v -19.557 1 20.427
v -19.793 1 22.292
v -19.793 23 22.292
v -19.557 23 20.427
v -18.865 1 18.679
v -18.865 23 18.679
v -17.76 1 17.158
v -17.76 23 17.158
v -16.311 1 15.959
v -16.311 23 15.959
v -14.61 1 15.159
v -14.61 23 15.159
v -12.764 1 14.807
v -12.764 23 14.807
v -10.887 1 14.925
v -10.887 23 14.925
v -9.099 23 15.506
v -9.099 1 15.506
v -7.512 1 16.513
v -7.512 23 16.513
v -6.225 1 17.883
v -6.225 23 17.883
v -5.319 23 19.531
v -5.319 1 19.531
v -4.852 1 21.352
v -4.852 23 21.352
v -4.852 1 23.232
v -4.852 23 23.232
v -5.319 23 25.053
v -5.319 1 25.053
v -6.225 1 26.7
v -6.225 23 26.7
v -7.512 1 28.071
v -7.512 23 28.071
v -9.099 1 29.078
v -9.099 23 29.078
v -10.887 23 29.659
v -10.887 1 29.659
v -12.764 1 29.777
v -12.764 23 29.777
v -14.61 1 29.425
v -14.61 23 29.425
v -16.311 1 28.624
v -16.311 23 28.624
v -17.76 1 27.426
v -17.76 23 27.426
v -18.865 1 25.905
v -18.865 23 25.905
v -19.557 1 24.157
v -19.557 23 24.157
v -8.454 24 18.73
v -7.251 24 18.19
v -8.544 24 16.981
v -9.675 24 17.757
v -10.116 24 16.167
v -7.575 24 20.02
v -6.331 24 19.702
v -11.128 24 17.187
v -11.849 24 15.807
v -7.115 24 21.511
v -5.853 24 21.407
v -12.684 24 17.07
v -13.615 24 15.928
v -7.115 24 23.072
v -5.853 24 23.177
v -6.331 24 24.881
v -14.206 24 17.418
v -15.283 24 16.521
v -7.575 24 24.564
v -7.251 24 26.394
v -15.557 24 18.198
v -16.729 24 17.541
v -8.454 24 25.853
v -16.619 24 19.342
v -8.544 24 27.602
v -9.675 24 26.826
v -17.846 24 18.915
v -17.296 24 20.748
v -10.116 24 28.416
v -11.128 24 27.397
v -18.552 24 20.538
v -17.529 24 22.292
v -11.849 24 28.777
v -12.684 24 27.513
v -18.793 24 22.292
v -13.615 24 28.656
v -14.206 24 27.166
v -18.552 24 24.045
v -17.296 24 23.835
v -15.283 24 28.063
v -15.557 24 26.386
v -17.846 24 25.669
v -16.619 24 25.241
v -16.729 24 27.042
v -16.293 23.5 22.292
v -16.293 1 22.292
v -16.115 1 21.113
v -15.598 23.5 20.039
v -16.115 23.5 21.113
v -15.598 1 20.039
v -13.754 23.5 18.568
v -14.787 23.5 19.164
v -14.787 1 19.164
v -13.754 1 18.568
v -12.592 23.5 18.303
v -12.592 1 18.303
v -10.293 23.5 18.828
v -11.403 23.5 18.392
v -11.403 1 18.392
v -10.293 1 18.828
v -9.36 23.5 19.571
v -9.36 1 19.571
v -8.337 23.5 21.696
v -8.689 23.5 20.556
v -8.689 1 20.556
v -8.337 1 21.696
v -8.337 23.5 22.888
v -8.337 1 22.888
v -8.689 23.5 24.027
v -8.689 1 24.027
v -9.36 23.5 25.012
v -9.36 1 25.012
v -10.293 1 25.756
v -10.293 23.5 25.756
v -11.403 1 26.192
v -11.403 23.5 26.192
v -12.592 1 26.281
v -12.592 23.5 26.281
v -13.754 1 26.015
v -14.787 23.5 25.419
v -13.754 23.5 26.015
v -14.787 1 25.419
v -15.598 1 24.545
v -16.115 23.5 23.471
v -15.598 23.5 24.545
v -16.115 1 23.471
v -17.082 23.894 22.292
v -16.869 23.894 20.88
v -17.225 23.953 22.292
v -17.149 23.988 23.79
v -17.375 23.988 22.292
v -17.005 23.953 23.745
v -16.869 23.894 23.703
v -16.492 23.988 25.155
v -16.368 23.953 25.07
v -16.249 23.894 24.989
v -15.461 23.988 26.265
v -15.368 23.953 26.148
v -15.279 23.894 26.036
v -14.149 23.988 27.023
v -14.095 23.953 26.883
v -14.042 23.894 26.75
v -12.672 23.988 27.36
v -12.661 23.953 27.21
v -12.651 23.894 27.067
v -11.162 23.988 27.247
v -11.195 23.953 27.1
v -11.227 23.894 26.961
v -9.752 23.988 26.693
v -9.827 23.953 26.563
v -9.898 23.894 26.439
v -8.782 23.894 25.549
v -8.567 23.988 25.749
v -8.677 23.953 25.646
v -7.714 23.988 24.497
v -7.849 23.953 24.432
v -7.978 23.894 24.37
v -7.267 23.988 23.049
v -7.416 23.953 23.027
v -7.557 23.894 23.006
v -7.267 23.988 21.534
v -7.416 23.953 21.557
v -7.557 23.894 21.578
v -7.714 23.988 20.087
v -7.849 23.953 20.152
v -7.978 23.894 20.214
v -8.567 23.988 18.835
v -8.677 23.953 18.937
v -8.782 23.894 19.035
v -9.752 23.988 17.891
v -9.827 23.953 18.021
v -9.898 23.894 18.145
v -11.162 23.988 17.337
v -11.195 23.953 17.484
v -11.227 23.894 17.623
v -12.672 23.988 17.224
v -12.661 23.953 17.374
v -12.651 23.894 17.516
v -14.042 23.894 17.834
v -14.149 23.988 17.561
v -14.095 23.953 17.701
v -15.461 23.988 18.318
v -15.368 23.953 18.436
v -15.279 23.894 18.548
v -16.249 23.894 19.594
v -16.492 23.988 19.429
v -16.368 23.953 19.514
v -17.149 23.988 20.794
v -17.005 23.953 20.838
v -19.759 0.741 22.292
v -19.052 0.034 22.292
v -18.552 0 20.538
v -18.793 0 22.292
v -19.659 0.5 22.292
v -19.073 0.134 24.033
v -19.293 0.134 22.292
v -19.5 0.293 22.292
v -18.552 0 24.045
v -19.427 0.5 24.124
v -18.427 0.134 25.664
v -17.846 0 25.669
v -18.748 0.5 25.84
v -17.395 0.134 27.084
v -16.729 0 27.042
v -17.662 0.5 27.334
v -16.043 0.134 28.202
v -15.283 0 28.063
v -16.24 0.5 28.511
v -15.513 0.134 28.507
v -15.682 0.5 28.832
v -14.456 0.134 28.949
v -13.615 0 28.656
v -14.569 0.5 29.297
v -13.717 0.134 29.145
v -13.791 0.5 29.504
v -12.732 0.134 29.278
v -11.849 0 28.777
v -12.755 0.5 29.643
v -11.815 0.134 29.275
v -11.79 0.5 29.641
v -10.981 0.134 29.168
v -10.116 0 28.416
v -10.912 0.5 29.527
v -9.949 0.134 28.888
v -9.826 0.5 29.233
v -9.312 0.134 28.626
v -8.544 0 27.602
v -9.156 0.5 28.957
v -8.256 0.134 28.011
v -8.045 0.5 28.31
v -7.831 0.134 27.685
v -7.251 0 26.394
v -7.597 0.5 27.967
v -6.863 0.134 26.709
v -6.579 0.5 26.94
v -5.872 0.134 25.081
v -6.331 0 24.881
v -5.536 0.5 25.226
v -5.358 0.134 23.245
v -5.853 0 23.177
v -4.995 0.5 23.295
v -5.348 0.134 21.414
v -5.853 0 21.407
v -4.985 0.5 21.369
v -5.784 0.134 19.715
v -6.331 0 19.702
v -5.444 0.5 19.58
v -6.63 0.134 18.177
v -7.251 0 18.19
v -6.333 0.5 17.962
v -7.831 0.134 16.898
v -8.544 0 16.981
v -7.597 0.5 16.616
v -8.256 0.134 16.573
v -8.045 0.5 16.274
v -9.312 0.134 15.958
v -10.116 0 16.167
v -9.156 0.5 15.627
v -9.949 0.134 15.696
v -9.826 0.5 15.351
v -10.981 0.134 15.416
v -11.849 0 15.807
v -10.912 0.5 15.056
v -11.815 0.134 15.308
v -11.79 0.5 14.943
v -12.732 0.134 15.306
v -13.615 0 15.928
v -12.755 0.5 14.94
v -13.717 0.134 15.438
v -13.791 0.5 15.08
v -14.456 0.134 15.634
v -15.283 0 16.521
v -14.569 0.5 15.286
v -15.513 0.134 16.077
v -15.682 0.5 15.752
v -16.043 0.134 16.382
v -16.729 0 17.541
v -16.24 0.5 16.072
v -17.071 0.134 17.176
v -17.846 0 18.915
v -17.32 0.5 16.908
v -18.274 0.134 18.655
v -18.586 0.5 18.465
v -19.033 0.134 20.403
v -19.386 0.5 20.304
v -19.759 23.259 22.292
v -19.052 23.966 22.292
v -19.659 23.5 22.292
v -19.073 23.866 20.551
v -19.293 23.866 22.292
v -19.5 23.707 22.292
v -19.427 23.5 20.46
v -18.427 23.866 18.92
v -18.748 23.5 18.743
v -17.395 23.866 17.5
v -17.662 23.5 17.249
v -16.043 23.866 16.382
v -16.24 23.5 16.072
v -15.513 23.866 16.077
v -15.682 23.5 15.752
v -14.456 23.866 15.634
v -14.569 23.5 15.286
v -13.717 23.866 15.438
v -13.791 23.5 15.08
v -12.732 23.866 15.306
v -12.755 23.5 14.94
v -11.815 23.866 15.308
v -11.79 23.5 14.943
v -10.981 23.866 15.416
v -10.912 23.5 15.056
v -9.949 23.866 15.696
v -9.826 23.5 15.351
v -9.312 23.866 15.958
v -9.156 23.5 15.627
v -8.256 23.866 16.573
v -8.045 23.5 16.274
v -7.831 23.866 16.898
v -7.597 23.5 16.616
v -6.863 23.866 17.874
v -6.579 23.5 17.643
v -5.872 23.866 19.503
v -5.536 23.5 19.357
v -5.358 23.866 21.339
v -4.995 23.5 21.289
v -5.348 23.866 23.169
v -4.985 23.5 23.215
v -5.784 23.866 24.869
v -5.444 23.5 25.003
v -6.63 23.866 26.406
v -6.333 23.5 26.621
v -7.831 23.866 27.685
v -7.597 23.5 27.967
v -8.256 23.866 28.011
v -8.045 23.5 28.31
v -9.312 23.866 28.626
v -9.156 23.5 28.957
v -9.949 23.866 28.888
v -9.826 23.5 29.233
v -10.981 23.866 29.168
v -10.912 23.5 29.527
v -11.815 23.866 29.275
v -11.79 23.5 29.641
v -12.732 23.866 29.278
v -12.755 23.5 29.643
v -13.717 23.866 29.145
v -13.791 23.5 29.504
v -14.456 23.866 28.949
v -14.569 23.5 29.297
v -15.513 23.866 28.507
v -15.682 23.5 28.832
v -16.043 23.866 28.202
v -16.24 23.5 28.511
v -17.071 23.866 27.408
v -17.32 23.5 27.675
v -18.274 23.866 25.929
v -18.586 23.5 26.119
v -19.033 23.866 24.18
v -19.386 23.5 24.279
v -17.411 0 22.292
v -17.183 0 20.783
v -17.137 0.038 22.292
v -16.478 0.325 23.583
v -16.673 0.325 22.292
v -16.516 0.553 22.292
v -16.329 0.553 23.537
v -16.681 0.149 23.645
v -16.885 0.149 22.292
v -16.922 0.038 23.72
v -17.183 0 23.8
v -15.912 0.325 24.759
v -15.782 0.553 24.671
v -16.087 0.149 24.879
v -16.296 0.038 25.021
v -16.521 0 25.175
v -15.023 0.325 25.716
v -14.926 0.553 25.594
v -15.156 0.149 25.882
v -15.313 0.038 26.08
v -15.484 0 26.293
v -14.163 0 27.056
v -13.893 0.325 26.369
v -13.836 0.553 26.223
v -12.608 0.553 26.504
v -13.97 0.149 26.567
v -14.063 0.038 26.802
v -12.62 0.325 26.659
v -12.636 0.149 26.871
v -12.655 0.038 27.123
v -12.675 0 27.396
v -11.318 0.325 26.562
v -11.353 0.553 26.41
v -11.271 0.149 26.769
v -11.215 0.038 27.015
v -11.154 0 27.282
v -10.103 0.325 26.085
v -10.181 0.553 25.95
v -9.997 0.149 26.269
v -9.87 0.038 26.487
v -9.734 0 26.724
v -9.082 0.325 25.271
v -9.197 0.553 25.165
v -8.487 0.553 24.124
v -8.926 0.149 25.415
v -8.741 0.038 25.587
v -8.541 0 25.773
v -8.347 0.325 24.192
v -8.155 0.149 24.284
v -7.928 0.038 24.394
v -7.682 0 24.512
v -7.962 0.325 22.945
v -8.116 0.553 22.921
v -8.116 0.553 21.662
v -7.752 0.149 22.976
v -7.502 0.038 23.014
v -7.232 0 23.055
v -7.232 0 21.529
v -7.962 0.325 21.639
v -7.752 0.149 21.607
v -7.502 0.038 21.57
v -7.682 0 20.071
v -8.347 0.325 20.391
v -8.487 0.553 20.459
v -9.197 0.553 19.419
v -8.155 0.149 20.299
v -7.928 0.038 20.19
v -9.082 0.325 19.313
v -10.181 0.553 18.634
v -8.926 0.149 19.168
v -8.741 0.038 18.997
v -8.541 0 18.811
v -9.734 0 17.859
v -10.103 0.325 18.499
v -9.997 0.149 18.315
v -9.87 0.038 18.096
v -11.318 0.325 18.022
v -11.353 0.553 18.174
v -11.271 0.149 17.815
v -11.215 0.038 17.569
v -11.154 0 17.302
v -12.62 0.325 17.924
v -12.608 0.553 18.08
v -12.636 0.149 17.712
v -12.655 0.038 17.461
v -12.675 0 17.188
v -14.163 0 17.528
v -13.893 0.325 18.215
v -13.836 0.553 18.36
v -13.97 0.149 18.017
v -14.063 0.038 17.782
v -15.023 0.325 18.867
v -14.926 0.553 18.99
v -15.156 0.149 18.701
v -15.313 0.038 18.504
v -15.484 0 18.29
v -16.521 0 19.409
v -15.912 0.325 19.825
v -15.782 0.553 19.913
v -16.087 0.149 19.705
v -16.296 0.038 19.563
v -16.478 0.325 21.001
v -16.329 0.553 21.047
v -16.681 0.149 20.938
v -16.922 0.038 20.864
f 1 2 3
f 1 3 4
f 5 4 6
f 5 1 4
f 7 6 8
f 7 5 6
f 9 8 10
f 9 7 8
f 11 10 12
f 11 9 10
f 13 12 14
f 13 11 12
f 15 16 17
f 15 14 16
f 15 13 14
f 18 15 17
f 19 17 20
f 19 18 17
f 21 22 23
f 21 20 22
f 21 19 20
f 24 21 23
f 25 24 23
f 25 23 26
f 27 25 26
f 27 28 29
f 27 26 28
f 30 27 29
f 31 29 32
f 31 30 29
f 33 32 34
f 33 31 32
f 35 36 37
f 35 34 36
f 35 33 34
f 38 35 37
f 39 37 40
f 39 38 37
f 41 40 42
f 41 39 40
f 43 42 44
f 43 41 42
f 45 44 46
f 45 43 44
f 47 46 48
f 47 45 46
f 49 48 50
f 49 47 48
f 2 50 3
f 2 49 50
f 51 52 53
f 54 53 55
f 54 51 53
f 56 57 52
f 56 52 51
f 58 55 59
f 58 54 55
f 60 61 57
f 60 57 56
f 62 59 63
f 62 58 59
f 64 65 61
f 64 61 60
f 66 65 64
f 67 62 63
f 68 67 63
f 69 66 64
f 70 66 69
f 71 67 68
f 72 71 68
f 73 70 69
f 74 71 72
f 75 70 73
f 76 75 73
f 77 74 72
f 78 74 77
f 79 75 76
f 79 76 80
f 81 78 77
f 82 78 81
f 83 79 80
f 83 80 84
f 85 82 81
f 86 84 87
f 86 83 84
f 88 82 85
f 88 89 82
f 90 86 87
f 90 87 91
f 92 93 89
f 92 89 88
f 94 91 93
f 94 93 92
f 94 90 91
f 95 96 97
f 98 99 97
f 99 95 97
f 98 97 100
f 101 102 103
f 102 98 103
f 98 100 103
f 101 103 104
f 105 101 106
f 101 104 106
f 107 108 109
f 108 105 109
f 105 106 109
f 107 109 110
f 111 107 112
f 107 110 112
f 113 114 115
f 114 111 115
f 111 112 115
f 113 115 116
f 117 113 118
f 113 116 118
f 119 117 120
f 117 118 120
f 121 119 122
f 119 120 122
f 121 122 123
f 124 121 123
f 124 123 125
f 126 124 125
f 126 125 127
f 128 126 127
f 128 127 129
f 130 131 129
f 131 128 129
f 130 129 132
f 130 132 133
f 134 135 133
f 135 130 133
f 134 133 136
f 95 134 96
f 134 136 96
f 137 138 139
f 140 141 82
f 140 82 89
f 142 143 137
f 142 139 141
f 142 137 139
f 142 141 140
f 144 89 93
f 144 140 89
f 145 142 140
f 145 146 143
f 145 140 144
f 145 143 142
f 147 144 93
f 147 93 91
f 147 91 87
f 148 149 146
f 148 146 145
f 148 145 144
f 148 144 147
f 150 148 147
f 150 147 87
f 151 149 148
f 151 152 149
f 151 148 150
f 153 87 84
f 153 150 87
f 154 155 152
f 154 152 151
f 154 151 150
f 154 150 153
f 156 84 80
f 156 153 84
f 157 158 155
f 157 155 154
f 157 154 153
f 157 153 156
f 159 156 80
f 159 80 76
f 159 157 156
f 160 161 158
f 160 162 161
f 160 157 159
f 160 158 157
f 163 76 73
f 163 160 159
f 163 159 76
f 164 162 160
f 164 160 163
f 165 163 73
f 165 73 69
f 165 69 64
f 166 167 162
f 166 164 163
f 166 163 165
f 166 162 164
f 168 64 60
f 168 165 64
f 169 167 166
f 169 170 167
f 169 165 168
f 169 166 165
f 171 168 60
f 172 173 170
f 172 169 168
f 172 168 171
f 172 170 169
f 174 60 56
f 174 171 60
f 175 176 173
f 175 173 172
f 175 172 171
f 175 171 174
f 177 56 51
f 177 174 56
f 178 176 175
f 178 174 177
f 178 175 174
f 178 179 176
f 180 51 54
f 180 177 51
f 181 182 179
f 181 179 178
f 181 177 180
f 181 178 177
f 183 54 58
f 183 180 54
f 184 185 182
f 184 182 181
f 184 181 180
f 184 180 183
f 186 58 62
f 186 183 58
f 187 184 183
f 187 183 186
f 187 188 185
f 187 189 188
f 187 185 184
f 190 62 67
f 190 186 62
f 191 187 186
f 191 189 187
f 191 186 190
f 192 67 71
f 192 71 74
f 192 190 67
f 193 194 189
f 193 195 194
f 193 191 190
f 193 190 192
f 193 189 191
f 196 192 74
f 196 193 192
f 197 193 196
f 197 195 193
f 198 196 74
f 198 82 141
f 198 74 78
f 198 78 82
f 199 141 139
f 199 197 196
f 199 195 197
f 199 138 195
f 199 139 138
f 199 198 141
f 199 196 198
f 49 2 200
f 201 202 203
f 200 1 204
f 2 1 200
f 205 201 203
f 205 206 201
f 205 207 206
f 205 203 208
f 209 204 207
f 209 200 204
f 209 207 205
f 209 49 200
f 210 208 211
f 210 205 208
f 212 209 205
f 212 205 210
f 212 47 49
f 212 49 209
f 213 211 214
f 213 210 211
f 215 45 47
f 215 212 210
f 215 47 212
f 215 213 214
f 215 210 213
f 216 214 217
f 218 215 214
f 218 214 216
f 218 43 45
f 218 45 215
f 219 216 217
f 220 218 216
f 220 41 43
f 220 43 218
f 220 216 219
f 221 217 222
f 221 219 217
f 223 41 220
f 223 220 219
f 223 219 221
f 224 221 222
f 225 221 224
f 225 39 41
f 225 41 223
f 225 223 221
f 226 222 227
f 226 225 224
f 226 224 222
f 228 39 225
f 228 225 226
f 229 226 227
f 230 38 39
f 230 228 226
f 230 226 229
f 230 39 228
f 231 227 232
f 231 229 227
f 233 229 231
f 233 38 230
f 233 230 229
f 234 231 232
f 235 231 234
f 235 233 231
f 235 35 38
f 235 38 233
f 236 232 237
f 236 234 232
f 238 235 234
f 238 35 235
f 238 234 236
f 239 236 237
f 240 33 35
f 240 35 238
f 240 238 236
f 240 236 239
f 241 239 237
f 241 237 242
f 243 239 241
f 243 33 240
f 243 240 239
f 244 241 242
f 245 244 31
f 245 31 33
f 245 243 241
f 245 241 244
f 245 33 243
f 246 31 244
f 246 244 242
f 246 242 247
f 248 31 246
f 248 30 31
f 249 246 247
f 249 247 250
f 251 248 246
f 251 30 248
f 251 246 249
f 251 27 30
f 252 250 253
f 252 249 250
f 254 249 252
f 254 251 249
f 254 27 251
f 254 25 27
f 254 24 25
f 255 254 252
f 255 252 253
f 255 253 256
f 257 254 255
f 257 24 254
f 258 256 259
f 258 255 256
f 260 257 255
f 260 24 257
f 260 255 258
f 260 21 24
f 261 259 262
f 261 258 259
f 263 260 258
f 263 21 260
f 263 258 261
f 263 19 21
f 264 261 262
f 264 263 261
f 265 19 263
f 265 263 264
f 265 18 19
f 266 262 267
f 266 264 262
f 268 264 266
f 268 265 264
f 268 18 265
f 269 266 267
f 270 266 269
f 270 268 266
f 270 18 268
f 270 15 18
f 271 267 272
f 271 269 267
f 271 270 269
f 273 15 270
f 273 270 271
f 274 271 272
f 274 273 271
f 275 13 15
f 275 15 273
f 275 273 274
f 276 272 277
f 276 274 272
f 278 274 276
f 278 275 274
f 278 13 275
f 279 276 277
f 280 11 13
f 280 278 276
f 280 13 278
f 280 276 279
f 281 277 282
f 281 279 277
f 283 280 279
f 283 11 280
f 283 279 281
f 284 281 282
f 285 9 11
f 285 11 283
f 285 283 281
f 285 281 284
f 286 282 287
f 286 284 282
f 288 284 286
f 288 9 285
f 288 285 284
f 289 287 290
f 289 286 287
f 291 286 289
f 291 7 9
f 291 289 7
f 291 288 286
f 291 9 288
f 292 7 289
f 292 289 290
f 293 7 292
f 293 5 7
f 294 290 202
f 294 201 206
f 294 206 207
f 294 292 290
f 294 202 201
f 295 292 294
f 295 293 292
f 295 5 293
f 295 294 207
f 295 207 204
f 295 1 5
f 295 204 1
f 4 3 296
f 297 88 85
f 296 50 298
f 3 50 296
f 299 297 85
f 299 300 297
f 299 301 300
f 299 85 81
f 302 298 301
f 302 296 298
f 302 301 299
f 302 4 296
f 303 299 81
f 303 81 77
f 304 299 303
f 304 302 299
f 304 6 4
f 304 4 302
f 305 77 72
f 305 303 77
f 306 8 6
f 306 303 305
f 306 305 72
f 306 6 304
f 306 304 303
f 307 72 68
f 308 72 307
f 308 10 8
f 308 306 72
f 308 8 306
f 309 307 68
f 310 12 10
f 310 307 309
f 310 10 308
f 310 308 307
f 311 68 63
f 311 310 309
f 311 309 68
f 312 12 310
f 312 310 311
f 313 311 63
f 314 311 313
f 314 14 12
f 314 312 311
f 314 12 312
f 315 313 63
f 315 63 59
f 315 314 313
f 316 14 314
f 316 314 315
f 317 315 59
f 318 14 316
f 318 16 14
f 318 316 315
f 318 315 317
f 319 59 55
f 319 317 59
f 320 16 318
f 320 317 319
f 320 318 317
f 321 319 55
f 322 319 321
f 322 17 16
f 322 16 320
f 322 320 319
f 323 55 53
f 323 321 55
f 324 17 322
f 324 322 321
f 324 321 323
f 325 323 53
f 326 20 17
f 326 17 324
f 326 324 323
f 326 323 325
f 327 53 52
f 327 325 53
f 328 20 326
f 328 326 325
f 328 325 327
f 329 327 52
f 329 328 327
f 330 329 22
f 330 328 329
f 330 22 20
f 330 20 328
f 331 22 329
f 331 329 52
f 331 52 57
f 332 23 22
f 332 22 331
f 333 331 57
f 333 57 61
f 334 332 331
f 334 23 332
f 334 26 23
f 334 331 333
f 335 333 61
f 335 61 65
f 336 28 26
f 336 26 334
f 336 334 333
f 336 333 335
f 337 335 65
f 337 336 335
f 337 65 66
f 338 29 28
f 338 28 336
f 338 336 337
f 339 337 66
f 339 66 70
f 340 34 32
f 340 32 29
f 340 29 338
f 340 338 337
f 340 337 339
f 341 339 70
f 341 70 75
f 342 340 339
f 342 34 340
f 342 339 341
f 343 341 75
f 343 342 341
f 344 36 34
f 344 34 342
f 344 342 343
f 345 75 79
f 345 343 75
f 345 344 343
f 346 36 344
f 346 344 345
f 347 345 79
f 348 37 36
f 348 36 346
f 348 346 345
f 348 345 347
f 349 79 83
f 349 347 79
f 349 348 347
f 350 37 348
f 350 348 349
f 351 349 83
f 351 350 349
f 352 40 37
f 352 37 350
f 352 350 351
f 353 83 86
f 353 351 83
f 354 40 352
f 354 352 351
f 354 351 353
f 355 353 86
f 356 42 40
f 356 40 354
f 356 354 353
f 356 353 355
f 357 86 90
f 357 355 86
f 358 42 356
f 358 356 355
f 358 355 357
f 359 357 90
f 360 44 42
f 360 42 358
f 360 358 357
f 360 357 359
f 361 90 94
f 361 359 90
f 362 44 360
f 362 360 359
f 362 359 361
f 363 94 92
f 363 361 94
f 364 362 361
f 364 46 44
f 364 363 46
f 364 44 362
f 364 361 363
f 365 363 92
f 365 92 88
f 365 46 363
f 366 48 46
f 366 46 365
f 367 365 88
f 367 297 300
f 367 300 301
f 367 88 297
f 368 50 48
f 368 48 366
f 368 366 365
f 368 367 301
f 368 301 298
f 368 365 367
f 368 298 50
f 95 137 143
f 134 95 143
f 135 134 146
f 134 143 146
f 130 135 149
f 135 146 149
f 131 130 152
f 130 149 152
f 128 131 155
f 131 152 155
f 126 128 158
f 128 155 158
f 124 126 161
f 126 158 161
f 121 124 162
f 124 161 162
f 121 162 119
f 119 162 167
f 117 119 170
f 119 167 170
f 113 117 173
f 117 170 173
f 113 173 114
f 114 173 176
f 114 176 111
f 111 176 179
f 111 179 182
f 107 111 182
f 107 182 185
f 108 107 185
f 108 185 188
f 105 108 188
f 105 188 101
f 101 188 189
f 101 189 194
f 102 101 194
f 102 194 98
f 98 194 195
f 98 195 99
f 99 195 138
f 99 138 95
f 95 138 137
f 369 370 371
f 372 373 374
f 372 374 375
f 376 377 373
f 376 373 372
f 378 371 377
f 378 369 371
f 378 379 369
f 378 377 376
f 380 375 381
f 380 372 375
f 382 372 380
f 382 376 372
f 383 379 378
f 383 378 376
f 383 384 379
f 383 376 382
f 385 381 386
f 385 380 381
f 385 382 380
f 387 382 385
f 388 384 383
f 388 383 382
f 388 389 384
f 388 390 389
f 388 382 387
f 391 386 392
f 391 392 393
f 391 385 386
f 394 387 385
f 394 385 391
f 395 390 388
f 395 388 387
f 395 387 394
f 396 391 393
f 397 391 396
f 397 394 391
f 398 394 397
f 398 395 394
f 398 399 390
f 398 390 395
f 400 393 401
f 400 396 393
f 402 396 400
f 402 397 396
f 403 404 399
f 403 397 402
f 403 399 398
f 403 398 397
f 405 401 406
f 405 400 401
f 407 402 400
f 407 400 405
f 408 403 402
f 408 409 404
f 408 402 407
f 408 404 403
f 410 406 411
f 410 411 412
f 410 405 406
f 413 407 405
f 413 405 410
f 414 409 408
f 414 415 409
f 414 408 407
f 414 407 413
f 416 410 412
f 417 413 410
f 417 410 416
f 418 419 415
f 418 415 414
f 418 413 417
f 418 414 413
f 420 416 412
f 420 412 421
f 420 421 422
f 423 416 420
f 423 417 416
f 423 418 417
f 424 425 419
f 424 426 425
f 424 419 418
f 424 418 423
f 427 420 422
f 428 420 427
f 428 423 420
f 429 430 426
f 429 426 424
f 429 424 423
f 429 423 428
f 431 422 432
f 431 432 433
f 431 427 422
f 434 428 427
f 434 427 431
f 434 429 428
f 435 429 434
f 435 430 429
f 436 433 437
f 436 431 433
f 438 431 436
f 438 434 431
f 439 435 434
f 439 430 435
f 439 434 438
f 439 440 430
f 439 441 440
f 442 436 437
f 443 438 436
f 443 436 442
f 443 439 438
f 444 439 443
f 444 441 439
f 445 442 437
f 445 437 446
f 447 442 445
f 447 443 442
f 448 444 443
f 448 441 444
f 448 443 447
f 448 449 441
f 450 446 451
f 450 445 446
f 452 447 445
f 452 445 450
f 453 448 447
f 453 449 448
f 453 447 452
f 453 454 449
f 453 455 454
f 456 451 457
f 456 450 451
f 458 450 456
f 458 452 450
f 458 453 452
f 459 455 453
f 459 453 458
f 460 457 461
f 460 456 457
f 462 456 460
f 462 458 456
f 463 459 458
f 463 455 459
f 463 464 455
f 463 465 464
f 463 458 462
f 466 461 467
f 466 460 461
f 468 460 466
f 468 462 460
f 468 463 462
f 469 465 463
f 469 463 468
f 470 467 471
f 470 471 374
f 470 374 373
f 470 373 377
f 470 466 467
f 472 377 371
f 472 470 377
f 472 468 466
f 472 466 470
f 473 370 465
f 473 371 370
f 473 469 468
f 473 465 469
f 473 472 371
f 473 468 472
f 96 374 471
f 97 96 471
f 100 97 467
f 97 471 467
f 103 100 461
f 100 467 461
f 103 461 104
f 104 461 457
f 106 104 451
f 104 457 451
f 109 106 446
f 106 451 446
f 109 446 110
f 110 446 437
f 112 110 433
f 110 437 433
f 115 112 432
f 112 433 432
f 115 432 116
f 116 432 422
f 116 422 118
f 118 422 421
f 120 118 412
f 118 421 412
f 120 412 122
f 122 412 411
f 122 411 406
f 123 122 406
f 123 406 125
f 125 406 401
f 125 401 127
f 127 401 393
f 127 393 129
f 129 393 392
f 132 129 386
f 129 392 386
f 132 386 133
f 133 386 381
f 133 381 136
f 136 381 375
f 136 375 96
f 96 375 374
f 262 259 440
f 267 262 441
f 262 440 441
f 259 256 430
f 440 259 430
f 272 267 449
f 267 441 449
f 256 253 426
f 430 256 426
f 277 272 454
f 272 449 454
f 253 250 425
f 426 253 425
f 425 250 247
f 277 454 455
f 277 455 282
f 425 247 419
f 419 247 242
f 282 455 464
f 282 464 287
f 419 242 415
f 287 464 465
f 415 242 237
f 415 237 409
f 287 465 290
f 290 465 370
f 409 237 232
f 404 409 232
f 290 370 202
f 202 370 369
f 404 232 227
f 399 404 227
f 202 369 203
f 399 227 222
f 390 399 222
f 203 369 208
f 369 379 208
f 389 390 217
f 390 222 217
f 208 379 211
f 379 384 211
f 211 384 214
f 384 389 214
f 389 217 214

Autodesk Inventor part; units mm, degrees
ref_plane "YZ Plane" through (0, 0, 0) normal (1, 0, 0) x (0, 1, 0)
ref_plane "XZ Plane" through (0, 0, 0) normal (0, 1, 0) x (-1, 0, 0)
ref_plane "XY Plane" through (0, 0, 0) normal (0, 0, 1) x (1, 0, 0)
sketch "Sketch1" plane through (0, 0, 0) normal (0, 1, 0) x (-1, 0, 0)
  circle A0 centre (12.2927, 22.2918) radius 4
  circle A1 centre (12.2927, 22.2918) radius 7.5
  point P0 (0, 0)
  dimension "d0" = 8
  dimension "d1" = 15
extrude "Extrusion1" add sketch "Sketch1" along normal blind 24
chamfer "Chamfer1" distance 1 distance2 0.5 1 edges at (-8.2927, 24, 22.2918) measured on face at (-18.5146, 24, 21.3744)
fillet "Fillet2" radius 1 1 edges at (-4.7927, 24, 22.2918)
fillet "Fillet3" radius 1 1 edges at (-7.2927, 24, 22.2918)
chamfer "Chamfer2" distance 1 distance2 0.5 1 edges at (-8.2927, 0, 22.2918) measured on face at (-16.2409, 15.6667, 21.6501)
fillet "Fillet4" radius 1 1 edges at (-7.7927, 0, 22.2918)
fillet "Fillet5" radius 1 1 edges at (-4.7927, 0, 22.2918)
